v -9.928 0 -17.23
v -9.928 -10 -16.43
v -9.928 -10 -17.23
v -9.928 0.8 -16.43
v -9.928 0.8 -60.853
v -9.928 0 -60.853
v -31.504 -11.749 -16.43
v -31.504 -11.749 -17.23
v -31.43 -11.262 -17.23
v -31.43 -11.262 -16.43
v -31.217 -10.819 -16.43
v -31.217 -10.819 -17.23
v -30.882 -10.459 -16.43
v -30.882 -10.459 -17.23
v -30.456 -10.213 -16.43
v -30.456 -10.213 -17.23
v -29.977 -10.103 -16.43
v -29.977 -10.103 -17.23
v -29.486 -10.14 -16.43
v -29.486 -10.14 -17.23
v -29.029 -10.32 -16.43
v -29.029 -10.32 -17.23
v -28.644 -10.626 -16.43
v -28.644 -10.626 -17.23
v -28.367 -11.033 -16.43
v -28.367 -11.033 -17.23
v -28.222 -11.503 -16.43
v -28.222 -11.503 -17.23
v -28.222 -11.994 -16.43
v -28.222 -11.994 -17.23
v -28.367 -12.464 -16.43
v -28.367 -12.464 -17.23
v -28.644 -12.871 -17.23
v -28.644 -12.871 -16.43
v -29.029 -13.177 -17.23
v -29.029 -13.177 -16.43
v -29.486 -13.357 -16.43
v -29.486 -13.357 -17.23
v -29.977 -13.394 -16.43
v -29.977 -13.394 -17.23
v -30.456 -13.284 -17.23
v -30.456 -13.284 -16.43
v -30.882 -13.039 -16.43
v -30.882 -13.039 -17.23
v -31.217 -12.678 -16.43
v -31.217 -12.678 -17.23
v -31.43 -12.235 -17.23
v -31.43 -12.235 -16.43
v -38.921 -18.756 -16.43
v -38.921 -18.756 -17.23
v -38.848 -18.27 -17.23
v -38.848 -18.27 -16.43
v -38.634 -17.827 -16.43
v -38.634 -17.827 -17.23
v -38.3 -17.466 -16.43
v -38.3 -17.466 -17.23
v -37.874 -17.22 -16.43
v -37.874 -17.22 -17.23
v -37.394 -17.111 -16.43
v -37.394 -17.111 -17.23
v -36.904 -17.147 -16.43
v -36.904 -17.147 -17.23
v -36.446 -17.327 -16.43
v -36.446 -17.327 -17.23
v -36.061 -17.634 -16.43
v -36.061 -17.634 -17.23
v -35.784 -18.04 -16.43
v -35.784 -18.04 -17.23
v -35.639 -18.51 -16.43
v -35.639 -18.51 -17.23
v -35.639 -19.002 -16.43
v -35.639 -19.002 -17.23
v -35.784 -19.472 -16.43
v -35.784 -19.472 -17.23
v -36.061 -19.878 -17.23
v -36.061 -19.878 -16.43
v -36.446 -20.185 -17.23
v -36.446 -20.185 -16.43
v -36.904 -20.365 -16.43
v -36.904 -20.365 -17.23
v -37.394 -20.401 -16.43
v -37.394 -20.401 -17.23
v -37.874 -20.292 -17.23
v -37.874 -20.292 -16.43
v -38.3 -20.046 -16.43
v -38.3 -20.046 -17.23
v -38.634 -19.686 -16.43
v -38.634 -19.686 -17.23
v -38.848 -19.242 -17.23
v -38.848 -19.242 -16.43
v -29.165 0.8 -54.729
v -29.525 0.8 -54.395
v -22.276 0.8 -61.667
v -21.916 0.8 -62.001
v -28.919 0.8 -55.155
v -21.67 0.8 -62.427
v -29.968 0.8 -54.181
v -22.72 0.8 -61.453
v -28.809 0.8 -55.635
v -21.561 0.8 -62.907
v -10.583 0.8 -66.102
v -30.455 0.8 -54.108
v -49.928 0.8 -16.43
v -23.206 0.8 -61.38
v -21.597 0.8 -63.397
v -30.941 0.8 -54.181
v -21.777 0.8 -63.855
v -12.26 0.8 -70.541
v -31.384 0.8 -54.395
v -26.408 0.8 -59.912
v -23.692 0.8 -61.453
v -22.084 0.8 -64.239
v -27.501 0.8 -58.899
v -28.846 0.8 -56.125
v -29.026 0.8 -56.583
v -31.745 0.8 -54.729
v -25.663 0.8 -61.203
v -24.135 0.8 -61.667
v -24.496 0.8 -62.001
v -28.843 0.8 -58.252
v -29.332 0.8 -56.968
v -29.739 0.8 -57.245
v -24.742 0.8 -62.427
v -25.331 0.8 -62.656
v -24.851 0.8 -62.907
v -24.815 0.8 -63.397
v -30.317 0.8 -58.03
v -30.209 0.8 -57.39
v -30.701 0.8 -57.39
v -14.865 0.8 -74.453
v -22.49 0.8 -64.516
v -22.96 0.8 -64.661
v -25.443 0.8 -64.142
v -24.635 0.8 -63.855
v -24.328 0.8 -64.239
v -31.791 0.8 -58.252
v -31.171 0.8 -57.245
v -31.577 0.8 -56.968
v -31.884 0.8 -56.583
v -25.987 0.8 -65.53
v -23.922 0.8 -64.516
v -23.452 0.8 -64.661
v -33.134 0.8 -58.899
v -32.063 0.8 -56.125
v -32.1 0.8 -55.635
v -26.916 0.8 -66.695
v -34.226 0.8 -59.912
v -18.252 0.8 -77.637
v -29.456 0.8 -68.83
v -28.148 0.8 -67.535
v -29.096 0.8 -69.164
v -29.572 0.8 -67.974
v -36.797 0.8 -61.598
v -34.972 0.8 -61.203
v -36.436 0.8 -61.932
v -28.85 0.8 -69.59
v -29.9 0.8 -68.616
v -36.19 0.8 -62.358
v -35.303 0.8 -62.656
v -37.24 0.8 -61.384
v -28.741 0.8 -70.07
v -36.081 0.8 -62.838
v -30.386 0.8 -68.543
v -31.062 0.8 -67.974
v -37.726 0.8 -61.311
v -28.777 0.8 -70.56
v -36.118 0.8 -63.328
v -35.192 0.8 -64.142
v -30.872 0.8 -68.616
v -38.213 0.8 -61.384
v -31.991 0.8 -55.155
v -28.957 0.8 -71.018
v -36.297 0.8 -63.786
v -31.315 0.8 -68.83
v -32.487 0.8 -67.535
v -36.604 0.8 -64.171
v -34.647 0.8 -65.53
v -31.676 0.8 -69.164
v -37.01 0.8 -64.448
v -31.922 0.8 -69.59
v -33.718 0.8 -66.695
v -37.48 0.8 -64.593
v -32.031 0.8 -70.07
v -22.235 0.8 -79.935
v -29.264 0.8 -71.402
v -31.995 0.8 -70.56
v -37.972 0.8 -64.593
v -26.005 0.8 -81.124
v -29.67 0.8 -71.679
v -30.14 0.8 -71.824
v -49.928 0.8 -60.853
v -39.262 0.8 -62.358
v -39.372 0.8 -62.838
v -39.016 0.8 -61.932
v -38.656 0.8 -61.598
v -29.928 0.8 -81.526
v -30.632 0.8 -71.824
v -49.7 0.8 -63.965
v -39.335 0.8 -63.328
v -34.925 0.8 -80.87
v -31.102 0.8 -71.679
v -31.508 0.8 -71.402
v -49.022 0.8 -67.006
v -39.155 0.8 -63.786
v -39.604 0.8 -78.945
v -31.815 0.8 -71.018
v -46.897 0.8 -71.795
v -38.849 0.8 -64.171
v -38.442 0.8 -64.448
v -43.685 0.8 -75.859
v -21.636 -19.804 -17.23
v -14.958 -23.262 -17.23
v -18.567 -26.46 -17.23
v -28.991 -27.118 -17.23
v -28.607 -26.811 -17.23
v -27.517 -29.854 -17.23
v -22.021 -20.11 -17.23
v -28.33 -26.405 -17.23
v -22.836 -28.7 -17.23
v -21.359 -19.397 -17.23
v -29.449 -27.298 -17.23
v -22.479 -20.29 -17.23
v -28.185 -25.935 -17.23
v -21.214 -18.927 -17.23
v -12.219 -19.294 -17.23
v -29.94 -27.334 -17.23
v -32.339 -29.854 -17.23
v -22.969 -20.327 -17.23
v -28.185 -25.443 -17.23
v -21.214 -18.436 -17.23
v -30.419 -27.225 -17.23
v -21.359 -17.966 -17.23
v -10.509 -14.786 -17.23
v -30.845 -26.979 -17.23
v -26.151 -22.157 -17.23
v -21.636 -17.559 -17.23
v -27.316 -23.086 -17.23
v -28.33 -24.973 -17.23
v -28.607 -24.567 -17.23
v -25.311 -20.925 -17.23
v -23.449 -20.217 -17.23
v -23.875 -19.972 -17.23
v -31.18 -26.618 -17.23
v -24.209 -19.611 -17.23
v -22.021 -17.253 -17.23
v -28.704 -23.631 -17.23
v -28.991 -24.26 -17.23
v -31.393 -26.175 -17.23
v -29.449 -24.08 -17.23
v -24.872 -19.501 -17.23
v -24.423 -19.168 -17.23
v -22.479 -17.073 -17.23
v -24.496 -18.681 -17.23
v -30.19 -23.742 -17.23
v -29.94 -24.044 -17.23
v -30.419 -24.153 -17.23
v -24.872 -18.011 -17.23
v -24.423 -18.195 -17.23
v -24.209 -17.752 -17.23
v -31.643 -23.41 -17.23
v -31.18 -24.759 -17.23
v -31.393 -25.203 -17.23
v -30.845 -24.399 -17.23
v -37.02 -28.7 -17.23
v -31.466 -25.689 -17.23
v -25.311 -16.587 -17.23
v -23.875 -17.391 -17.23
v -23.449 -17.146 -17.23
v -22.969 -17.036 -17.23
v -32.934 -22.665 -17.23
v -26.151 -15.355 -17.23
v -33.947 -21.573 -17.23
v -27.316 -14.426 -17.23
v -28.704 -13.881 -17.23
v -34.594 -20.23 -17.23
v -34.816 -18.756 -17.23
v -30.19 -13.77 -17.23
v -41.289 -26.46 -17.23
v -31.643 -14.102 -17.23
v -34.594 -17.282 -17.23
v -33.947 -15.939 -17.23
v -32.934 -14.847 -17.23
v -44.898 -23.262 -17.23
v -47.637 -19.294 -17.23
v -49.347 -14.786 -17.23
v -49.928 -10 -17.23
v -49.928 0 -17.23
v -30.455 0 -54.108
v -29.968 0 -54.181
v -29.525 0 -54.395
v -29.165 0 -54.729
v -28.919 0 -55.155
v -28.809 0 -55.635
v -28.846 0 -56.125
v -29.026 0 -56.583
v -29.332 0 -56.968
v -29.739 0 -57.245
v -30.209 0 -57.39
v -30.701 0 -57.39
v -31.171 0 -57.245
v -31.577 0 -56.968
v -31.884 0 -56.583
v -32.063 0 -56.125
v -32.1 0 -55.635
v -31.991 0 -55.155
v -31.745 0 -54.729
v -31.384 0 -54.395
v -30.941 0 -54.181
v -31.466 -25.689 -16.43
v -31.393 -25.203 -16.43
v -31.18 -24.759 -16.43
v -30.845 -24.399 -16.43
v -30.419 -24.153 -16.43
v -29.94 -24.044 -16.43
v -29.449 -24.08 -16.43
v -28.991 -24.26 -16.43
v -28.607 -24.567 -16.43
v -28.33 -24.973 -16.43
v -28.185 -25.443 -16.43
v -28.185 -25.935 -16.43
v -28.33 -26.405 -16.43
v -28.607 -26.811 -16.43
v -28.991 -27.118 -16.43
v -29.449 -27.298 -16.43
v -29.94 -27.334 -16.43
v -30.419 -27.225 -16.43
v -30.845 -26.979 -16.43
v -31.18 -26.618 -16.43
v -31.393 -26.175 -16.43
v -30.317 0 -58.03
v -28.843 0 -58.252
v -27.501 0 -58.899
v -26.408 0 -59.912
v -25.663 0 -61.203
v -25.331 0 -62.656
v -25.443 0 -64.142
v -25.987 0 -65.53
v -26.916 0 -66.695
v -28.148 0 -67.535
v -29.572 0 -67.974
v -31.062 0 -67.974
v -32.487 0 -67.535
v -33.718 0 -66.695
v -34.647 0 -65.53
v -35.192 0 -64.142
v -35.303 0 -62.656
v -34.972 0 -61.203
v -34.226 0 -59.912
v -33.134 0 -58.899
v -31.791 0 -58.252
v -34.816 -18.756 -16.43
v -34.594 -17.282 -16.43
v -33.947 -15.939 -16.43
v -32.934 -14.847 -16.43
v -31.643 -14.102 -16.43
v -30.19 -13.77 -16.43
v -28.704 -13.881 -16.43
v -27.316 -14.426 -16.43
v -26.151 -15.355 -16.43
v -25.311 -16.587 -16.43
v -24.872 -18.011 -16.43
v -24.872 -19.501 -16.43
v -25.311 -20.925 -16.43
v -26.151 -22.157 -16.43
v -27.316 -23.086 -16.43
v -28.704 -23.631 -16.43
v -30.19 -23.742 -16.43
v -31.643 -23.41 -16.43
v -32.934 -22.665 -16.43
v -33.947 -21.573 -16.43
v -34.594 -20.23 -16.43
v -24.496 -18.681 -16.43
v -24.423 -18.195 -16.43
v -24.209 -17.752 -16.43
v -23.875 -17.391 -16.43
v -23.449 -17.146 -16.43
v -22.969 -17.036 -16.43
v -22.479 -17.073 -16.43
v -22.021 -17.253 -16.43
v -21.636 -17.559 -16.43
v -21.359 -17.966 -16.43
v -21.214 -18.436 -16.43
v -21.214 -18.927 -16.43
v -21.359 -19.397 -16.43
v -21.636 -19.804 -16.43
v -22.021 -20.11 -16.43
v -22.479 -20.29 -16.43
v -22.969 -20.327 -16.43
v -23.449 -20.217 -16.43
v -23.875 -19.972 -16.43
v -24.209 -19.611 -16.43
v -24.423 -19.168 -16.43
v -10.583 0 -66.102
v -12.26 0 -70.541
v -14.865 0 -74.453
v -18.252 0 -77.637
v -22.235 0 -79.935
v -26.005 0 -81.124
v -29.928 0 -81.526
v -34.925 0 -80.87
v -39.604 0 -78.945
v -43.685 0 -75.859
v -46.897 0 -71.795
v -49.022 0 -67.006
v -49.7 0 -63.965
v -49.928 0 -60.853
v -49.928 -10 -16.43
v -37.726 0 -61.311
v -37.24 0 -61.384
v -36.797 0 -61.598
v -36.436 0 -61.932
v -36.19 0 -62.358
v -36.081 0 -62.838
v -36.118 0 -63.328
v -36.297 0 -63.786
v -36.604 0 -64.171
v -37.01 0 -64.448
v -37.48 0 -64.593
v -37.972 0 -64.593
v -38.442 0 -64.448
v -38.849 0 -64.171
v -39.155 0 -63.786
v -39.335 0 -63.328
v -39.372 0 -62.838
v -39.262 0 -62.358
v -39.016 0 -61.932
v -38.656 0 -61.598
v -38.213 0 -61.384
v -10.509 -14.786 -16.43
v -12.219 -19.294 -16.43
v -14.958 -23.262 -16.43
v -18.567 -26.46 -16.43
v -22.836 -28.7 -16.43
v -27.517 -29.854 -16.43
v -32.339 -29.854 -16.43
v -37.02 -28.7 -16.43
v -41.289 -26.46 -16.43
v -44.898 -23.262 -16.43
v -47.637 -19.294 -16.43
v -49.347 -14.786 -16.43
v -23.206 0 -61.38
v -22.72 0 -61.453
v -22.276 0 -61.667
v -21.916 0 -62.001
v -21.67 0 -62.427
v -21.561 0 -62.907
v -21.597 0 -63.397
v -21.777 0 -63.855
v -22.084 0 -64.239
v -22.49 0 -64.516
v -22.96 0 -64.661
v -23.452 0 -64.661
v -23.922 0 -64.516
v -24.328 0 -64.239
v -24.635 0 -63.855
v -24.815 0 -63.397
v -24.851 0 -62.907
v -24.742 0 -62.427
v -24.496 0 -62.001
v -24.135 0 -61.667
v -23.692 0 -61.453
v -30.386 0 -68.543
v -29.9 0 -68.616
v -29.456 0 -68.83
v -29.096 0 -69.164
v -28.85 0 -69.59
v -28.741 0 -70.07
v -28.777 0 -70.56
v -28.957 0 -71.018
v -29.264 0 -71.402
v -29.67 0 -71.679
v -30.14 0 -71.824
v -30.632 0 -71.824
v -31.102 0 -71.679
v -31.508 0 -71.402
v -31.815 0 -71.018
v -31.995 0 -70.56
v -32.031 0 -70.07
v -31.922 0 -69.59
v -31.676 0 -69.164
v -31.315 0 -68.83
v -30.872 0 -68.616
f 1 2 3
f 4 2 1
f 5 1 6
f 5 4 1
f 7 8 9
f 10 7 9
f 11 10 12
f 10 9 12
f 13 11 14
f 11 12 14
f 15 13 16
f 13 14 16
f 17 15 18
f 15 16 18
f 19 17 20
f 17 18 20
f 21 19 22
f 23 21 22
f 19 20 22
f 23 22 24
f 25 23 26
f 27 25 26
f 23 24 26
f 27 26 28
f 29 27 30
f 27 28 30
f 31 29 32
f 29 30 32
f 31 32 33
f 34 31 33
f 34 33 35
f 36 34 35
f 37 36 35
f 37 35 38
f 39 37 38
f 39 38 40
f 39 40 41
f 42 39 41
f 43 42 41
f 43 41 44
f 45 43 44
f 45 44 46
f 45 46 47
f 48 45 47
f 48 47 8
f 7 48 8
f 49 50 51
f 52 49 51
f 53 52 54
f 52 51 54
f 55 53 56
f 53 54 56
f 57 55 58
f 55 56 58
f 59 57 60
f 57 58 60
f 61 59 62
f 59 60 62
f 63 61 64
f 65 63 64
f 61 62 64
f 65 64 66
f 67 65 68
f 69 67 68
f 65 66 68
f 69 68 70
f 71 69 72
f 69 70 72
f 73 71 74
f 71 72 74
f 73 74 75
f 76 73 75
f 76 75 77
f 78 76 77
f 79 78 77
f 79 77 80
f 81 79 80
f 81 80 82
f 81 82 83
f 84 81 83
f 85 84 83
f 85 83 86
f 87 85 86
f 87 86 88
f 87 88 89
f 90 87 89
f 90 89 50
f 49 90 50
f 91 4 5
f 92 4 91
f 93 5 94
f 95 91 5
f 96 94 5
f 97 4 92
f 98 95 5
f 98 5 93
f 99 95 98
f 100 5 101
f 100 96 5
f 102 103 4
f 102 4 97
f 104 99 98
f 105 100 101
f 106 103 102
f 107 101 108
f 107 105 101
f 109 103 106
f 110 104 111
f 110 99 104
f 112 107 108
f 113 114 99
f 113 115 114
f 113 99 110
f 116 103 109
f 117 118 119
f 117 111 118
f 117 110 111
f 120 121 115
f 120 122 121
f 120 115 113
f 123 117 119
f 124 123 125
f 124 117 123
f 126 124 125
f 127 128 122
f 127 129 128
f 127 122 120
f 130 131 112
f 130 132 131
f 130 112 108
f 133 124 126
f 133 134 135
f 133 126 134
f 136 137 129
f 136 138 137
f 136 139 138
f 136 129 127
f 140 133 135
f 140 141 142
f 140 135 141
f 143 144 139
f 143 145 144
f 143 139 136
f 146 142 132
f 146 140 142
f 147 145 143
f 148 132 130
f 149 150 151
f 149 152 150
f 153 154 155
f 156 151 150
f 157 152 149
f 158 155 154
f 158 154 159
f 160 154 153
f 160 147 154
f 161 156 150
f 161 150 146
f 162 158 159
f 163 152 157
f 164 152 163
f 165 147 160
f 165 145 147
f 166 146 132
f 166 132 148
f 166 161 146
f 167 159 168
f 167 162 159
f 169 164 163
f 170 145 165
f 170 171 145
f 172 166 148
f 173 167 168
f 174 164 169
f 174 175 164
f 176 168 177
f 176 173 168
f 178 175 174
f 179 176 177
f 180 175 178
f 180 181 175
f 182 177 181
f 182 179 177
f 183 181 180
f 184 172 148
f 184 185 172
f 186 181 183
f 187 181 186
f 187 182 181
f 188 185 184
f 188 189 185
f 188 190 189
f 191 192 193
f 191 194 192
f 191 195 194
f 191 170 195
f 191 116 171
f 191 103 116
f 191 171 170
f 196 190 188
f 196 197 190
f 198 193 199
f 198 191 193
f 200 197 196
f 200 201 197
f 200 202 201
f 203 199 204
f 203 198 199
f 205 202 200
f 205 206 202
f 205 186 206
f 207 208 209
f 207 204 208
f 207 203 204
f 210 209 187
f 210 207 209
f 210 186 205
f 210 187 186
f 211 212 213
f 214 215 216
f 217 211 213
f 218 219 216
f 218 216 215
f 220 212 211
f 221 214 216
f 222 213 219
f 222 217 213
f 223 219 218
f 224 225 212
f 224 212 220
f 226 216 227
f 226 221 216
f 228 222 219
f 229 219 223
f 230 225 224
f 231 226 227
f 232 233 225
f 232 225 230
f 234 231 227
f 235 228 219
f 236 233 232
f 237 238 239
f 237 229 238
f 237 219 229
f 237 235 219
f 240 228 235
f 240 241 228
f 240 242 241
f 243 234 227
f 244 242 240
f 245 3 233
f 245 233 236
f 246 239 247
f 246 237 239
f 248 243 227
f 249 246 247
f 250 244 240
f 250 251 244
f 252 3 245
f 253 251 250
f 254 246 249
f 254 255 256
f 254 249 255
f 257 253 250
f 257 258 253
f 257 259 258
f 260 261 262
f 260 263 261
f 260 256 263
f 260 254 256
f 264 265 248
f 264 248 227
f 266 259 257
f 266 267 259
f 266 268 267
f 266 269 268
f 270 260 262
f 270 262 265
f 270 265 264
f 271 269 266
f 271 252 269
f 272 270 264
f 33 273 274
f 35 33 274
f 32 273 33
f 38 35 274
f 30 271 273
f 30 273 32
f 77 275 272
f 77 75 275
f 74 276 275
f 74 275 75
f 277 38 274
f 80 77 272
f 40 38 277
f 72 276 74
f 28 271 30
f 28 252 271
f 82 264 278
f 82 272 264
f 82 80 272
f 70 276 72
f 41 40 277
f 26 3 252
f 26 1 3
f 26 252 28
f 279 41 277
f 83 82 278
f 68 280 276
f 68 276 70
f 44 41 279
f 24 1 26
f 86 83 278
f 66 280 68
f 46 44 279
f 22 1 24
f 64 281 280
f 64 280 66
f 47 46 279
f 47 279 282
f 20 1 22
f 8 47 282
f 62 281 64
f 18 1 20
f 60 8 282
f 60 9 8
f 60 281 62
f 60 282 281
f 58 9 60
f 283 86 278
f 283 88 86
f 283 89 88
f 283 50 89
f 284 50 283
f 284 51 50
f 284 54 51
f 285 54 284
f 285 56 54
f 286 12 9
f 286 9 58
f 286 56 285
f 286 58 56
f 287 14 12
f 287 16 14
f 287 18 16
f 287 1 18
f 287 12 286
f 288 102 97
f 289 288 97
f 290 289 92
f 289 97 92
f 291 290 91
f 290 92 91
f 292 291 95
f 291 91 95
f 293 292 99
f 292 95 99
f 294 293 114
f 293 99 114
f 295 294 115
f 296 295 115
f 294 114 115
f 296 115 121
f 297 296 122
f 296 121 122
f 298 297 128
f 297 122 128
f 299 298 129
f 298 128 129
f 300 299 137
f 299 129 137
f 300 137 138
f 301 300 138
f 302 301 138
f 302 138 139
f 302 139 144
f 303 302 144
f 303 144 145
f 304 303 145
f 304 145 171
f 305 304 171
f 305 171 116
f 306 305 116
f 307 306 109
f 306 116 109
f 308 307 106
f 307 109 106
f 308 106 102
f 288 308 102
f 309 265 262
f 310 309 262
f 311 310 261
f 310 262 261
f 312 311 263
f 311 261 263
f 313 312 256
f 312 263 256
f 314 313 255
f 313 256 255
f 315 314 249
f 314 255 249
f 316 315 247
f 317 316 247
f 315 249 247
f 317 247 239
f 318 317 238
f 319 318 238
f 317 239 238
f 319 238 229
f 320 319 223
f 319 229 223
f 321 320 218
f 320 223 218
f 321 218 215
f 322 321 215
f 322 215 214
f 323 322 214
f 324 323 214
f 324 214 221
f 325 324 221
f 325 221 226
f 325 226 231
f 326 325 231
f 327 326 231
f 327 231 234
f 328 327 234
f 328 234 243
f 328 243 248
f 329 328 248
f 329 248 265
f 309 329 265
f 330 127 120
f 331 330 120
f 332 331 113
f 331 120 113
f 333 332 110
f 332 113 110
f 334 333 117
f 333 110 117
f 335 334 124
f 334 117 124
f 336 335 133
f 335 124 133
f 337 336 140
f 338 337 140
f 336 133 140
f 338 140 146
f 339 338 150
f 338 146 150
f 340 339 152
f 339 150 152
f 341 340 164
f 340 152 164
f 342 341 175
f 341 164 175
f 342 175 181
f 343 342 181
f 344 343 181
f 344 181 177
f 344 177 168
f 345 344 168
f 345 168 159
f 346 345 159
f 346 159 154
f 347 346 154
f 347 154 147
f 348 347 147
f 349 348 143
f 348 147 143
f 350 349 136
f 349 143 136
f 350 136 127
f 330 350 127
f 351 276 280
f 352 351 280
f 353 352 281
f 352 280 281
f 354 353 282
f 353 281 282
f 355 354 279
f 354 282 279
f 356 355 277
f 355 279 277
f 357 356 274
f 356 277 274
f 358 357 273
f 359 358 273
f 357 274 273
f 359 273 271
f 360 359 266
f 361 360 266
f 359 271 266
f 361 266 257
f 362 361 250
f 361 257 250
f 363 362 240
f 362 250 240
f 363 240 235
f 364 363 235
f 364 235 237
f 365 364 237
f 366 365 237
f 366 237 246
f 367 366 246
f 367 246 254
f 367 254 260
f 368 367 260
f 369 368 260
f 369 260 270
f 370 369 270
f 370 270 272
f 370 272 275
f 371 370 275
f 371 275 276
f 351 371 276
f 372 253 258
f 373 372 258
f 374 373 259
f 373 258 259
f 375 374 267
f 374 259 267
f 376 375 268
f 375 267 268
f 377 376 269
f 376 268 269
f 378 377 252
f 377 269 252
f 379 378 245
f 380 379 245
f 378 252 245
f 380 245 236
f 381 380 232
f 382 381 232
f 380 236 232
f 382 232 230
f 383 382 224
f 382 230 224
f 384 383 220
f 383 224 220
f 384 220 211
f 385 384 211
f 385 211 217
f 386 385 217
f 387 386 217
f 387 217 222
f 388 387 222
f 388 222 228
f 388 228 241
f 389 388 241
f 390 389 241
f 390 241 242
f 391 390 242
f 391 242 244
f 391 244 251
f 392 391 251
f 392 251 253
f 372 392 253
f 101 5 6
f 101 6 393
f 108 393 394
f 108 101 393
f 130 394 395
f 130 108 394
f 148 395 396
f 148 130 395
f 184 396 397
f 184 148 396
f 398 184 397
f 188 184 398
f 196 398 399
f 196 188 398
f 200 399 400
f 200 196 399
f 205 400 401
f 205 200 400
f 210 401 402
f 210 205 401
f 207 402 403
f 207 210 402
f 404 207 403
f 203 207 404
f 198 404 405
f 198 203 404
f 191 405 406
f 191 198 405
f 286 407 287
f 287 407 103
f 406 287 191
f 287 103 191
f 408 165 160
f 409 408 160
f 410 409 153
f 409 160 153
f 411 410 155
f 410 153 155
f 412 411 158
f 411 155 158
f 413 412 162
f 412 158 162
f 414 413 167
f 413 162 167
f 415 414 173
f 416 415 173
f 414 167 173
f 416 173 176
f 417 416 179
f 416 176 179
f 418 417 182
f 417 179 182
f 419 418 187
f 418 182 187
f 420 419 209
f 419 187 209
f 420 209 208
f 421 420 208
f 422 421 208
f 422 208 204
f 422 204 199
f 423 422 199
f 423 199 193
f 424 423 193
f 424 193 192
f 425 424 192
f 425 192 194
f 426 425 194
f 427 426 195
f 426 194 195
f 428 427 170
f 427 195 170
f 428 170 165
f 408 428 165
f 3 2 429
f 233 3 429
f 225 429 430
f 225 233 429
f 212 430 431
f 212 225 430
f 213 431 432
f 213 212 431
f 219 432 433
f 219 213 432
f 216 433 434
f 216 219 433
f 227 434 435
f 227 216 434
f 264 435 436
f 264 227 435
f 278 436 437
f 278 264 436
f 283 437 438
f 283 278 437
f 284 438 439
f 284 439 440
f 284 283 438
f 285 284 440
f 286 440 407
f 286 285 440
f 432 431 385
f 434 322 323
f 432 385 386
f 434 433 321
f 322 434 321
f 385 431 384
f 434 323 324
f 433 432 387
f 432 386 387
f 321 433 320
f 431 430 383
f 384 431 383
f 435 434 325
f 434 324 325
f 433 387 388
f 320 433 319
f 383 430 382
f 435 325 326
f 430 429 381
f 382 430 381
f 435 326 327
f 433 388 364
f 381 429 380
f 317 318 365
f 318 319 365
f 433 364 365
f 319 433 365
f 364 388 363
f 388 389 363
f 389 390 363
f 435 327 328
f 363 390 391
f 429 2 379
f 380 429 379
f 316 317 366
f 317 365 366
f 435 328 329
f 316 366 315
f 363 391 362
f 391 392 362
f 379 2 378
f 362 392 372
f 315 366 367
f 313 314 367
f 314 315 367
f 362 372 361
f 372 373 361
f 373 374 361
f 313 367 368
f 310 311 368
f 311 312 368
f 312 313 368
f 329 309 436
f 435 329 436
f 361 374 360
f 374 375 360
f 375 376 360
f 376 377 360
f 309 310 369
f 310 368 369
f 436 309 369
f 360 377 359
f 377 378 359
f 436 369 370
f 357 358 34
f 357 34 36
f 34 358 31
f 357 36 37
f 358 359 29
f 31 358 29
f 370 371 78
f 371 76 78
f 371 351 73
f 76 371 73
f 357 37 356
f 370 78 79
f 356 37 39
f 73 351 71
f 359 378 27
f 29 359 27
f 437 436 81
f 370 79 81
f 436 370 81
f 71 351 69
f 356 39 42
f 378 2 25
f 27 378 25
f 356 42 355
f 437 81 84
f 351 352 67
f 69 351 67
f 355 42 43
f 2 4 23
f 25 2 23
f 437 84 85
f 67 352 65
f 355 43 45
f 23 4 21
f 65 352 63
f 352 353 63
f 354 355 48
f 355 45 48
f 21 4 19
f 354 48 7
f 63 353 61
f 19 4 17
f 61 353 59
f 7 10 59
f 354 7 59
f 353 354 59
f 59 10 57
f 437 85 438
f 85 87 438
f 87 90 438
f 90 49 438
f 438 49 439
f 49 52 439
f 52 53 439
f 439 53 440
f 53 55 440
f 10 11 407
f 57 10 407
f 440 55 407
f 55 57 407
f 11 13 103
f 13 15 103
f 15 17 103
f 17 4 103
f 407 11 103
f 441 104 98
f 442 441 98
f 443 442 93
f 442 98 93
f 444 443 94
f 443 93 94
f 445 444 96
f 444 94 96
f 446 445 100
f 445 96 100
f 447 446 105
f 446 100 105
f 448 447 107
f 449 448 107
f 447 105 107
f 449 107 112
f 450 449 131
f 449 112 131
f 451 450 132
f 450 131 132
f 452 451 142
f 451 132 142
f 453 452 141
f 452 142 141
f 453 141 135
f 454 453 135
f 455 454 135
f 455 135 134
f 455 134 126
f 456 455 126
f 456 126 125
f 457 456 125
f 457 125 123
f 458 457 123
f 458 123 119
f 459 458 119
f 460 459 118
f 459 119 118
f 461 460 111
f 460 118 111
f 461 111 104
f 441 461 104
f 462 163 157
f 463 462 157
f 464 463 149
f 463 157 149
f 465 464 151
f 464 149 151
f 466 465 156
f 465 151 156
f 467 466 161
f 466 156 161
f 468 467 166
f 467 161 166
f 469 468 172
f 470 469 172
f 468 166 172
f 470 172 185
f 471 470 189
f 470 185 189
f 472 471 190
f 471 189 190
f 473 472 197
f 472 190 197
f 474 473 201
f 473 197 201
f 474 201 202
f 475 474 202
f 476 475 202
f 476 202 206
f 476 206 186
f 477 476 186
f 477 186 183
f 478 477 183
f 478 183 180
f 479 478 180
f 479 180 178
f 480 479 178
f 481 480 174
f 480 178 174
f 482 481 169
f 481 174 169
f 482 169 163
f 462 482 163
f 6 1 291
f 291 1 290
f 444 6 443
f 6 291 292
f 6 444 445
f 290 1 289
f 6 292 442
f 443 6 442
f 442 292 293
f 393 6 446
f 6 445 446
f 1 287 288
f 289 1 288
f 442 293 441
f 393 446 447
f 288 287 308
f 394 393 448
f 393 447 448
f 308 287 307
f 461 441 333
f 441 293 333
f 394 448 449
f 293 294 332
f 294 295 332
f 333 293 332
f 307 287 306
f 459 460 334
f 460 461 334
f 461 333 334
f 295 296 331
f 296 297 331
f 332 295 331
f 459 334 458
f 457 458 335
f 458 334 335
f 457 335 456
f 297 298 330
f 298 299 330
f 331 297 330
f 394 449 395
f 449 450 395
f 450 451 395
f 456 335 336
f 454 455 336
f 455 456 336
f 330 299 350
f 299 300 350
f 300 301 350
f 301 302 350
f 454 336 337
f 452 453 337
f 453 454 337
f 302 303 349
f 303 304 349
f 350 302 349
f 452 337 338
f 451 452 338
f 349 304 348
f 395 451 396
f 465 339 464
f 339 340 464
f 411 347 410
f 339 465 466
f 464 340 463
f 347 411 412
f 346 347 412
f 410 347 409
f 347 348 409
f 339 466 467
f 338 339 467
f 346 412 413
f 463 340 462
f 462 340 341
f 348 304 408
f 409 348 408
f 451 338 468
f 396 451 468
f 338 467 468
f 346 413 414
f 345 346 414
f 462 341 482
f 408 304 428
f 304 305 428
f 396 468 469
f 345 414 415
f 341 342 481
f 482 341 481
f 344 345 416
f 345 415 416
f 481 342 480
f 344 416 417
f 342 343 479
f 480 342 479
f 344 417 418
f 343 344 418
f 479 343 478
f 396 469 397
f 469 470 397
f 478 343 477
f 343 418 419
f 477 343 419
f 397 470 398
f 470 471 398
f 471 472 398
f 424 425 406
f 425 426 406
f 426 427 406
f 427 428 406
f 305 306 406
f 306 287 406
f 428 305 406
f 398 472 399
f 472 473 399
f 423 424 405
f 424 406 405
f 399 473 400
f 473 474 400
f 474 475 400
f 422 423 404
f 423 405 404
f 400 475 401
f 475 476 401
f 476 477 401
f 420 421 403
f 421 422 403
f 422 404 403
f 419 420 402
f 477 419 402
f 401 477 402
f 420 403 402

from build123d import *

# Parameters (mm, degrees)
SKETCH1_W           = 40
SKETCH1_H           = 60
BOSS_EXTRUDE1_DEPTH = 0.8
SKETCH2_RX          = 20.672864439
SKETCH2_RY          = 20
BOSS_EXTRUDE2_DEPTH = 0.8
SKETCH5_R           = 5
SKETCH5_R_2         = 1.65
CUT_EXTRUDE3_DEPTH  = 0.8
SKETCH6_W           = 40
SKETCH6_H           = 15.577429974
CUT_EXTRUDE4_DEPTH  = 10
SKETCH7_W           = 40
SKETCH7_H           = 0.8
BOSS_EXTRUDE3_DEPTH = 10
SKETCH8_R           = 20
BOSS_EXTRUDE4_DEPTH = 0.8
SKETCH9_W           = 37.719804767
SKETCH9_H           = 12.136565496
CUT_EXTRUDE5_DEPTH  = 0.8
SKETCH10_R          = 5
SKETCH10_R_2        = 1.65
CUT_EXTRUDE8_DEPTH  = 9.8


with BuildPart() as part:
    # Sketch1 → Boss-Extrude1 (new body)
    with BuildSketch(Plane(origin=(0, 0, 0), x_dir=(1, 0, 0), z_dir=(0, 1, 0))):
        with Locations((-29.928059701, 30.852985075)):
            Rectangle(SKETCH1_W, SKETCH1_H)
    extrude(amount=BOSS_EXTRUDE1_DEPTH)

    # Sketch2 → Boss-Extrude2 (add)
    with BuildSketch(Plane(origin=(0, 0.8, 0), x_dir=(1, 0, 0), z_dir=(0, 1, 0))):
        with Locations(Location((-29.928059701, 60.852985075), (0, 0, 90))):
            Ellipse(SKETCH2_RX, SKETCH2_RY)
    extrude(amount=-BOSS_EXTRUDE2_DEPTH)

    # Sketch5 → Cut-Extrude3 (cut)
    with BuildSketch(Plane(origin=(0, 0.8, 0), x_dir=(1, 0, 0), z_dir=(0, 1, 0))):
        with Locations(Location((-30.317199226, 63.029873106, 0), (0, 0, 270))):
            Circle(SKETCH5_R)
        with Locations(Location((-30.385900954, 70.192815662, 0), (0, 0, 270))):
            Circle(SKETCH5_R_2)
        with Locations(Location((-23.205910665, 63.029873106, 0), (0, 0, 270))):
            Circle(SKETCH5_R_2)
        with Locations(Location((-37.726365539, 62.961171378, 0), (0, 0, 270))):
            Circle(SKETCH5_R_2)
        with Locations(Location((-30.454602681, 55.758110249, 0), (0, 0, 270))):
            Circle(SKETCH5_R_2)
    extrude(amount=-CUT_EXTRUDE3_DEPTH, mode=Mode.SUBTRACT)

    # Sketch6 → Cut-Extrude4 (cut)
    with BuildSketch(Plane(origin=(0, 0, 0), x_dir=(-1, 0, 0), z_dir=(0, -1, 0))):
        with Locations((29.928059701, 8.641700062)):
            Rectangle(SKETCH6_W, SKETCH6_H)
    extrude(amount=-CUT_EXTRUDE4_DEPTH, mode=Mode.SUBTRACT)

    # Sketch7 → Boss-Extrude3 (add)
    with BuildSketch(Plane(origin=(0, 0, 0), x_dir=(-1, 0, 0), z_dir=(0, -1, 0))):
        with Locations((29.928059701, 16.830415049)):
            Rectangle(SKETCH7_W, SKETCH7_H)
    extrude(amount=BOSS_EXTRUDE3_DEPTH)

    # Sketch8 → Boss-Extrude4 (add)
    with BuildSketch(Plane(origin=(0, 0, -17.230415049), x_dir=(-1, 0, 0), z_dir=(0, 0, -1))):
        with Locations((29.928059701, -10)):
            Circle(SKETCH8_R)
    extrude(amount=-BOSS_EXTRUDE4_DEPTH)

    # Sketch9 → Cut-Extrude5 (cut)
    with BuildSketch(Plane(origin=(0, 0, -17.230415049), x_dir=(-1, 0, 0), z_dir=(0, 0, -1))):
        with Locations((31.954661755, 6.868282748)):
            Rectangle(SKETCH9_W, SKETCH9_H)
    extrude(amount=-CUT_EXTRUDE5_DEPTH, mode=Mode.SUBTRACT)

    # Sketch10 → Cut-Extrude8 (cut)
    with BuildSketch(Plane(origin=(0, 0, -17.230415049), x_dir=(-1, 0, 0), z_dir=(0, 0, -1))):
        with Locations((29.816238189, -18.756032874)):
            Circle(SKETCH10_R)
        with Locations((29.853512027, -11.748551436)):
            Circle(SKETCH10_R_2)
        with Locations((37.271005677, -18.756032874)):
            Circle(SKETCH10_R_2)
        with Locations((29.816238189, -25.688966638)):
            Circle(SKETCH10_R_2)
        with Locations((22.846030588, -18.681485199)):
            Circle(SKETCH10_R_2)
    extrude(amount=-CUT_EXTRUDE8_DEPTH, mode=Mode.SUBTRACT)


solid = part.part
